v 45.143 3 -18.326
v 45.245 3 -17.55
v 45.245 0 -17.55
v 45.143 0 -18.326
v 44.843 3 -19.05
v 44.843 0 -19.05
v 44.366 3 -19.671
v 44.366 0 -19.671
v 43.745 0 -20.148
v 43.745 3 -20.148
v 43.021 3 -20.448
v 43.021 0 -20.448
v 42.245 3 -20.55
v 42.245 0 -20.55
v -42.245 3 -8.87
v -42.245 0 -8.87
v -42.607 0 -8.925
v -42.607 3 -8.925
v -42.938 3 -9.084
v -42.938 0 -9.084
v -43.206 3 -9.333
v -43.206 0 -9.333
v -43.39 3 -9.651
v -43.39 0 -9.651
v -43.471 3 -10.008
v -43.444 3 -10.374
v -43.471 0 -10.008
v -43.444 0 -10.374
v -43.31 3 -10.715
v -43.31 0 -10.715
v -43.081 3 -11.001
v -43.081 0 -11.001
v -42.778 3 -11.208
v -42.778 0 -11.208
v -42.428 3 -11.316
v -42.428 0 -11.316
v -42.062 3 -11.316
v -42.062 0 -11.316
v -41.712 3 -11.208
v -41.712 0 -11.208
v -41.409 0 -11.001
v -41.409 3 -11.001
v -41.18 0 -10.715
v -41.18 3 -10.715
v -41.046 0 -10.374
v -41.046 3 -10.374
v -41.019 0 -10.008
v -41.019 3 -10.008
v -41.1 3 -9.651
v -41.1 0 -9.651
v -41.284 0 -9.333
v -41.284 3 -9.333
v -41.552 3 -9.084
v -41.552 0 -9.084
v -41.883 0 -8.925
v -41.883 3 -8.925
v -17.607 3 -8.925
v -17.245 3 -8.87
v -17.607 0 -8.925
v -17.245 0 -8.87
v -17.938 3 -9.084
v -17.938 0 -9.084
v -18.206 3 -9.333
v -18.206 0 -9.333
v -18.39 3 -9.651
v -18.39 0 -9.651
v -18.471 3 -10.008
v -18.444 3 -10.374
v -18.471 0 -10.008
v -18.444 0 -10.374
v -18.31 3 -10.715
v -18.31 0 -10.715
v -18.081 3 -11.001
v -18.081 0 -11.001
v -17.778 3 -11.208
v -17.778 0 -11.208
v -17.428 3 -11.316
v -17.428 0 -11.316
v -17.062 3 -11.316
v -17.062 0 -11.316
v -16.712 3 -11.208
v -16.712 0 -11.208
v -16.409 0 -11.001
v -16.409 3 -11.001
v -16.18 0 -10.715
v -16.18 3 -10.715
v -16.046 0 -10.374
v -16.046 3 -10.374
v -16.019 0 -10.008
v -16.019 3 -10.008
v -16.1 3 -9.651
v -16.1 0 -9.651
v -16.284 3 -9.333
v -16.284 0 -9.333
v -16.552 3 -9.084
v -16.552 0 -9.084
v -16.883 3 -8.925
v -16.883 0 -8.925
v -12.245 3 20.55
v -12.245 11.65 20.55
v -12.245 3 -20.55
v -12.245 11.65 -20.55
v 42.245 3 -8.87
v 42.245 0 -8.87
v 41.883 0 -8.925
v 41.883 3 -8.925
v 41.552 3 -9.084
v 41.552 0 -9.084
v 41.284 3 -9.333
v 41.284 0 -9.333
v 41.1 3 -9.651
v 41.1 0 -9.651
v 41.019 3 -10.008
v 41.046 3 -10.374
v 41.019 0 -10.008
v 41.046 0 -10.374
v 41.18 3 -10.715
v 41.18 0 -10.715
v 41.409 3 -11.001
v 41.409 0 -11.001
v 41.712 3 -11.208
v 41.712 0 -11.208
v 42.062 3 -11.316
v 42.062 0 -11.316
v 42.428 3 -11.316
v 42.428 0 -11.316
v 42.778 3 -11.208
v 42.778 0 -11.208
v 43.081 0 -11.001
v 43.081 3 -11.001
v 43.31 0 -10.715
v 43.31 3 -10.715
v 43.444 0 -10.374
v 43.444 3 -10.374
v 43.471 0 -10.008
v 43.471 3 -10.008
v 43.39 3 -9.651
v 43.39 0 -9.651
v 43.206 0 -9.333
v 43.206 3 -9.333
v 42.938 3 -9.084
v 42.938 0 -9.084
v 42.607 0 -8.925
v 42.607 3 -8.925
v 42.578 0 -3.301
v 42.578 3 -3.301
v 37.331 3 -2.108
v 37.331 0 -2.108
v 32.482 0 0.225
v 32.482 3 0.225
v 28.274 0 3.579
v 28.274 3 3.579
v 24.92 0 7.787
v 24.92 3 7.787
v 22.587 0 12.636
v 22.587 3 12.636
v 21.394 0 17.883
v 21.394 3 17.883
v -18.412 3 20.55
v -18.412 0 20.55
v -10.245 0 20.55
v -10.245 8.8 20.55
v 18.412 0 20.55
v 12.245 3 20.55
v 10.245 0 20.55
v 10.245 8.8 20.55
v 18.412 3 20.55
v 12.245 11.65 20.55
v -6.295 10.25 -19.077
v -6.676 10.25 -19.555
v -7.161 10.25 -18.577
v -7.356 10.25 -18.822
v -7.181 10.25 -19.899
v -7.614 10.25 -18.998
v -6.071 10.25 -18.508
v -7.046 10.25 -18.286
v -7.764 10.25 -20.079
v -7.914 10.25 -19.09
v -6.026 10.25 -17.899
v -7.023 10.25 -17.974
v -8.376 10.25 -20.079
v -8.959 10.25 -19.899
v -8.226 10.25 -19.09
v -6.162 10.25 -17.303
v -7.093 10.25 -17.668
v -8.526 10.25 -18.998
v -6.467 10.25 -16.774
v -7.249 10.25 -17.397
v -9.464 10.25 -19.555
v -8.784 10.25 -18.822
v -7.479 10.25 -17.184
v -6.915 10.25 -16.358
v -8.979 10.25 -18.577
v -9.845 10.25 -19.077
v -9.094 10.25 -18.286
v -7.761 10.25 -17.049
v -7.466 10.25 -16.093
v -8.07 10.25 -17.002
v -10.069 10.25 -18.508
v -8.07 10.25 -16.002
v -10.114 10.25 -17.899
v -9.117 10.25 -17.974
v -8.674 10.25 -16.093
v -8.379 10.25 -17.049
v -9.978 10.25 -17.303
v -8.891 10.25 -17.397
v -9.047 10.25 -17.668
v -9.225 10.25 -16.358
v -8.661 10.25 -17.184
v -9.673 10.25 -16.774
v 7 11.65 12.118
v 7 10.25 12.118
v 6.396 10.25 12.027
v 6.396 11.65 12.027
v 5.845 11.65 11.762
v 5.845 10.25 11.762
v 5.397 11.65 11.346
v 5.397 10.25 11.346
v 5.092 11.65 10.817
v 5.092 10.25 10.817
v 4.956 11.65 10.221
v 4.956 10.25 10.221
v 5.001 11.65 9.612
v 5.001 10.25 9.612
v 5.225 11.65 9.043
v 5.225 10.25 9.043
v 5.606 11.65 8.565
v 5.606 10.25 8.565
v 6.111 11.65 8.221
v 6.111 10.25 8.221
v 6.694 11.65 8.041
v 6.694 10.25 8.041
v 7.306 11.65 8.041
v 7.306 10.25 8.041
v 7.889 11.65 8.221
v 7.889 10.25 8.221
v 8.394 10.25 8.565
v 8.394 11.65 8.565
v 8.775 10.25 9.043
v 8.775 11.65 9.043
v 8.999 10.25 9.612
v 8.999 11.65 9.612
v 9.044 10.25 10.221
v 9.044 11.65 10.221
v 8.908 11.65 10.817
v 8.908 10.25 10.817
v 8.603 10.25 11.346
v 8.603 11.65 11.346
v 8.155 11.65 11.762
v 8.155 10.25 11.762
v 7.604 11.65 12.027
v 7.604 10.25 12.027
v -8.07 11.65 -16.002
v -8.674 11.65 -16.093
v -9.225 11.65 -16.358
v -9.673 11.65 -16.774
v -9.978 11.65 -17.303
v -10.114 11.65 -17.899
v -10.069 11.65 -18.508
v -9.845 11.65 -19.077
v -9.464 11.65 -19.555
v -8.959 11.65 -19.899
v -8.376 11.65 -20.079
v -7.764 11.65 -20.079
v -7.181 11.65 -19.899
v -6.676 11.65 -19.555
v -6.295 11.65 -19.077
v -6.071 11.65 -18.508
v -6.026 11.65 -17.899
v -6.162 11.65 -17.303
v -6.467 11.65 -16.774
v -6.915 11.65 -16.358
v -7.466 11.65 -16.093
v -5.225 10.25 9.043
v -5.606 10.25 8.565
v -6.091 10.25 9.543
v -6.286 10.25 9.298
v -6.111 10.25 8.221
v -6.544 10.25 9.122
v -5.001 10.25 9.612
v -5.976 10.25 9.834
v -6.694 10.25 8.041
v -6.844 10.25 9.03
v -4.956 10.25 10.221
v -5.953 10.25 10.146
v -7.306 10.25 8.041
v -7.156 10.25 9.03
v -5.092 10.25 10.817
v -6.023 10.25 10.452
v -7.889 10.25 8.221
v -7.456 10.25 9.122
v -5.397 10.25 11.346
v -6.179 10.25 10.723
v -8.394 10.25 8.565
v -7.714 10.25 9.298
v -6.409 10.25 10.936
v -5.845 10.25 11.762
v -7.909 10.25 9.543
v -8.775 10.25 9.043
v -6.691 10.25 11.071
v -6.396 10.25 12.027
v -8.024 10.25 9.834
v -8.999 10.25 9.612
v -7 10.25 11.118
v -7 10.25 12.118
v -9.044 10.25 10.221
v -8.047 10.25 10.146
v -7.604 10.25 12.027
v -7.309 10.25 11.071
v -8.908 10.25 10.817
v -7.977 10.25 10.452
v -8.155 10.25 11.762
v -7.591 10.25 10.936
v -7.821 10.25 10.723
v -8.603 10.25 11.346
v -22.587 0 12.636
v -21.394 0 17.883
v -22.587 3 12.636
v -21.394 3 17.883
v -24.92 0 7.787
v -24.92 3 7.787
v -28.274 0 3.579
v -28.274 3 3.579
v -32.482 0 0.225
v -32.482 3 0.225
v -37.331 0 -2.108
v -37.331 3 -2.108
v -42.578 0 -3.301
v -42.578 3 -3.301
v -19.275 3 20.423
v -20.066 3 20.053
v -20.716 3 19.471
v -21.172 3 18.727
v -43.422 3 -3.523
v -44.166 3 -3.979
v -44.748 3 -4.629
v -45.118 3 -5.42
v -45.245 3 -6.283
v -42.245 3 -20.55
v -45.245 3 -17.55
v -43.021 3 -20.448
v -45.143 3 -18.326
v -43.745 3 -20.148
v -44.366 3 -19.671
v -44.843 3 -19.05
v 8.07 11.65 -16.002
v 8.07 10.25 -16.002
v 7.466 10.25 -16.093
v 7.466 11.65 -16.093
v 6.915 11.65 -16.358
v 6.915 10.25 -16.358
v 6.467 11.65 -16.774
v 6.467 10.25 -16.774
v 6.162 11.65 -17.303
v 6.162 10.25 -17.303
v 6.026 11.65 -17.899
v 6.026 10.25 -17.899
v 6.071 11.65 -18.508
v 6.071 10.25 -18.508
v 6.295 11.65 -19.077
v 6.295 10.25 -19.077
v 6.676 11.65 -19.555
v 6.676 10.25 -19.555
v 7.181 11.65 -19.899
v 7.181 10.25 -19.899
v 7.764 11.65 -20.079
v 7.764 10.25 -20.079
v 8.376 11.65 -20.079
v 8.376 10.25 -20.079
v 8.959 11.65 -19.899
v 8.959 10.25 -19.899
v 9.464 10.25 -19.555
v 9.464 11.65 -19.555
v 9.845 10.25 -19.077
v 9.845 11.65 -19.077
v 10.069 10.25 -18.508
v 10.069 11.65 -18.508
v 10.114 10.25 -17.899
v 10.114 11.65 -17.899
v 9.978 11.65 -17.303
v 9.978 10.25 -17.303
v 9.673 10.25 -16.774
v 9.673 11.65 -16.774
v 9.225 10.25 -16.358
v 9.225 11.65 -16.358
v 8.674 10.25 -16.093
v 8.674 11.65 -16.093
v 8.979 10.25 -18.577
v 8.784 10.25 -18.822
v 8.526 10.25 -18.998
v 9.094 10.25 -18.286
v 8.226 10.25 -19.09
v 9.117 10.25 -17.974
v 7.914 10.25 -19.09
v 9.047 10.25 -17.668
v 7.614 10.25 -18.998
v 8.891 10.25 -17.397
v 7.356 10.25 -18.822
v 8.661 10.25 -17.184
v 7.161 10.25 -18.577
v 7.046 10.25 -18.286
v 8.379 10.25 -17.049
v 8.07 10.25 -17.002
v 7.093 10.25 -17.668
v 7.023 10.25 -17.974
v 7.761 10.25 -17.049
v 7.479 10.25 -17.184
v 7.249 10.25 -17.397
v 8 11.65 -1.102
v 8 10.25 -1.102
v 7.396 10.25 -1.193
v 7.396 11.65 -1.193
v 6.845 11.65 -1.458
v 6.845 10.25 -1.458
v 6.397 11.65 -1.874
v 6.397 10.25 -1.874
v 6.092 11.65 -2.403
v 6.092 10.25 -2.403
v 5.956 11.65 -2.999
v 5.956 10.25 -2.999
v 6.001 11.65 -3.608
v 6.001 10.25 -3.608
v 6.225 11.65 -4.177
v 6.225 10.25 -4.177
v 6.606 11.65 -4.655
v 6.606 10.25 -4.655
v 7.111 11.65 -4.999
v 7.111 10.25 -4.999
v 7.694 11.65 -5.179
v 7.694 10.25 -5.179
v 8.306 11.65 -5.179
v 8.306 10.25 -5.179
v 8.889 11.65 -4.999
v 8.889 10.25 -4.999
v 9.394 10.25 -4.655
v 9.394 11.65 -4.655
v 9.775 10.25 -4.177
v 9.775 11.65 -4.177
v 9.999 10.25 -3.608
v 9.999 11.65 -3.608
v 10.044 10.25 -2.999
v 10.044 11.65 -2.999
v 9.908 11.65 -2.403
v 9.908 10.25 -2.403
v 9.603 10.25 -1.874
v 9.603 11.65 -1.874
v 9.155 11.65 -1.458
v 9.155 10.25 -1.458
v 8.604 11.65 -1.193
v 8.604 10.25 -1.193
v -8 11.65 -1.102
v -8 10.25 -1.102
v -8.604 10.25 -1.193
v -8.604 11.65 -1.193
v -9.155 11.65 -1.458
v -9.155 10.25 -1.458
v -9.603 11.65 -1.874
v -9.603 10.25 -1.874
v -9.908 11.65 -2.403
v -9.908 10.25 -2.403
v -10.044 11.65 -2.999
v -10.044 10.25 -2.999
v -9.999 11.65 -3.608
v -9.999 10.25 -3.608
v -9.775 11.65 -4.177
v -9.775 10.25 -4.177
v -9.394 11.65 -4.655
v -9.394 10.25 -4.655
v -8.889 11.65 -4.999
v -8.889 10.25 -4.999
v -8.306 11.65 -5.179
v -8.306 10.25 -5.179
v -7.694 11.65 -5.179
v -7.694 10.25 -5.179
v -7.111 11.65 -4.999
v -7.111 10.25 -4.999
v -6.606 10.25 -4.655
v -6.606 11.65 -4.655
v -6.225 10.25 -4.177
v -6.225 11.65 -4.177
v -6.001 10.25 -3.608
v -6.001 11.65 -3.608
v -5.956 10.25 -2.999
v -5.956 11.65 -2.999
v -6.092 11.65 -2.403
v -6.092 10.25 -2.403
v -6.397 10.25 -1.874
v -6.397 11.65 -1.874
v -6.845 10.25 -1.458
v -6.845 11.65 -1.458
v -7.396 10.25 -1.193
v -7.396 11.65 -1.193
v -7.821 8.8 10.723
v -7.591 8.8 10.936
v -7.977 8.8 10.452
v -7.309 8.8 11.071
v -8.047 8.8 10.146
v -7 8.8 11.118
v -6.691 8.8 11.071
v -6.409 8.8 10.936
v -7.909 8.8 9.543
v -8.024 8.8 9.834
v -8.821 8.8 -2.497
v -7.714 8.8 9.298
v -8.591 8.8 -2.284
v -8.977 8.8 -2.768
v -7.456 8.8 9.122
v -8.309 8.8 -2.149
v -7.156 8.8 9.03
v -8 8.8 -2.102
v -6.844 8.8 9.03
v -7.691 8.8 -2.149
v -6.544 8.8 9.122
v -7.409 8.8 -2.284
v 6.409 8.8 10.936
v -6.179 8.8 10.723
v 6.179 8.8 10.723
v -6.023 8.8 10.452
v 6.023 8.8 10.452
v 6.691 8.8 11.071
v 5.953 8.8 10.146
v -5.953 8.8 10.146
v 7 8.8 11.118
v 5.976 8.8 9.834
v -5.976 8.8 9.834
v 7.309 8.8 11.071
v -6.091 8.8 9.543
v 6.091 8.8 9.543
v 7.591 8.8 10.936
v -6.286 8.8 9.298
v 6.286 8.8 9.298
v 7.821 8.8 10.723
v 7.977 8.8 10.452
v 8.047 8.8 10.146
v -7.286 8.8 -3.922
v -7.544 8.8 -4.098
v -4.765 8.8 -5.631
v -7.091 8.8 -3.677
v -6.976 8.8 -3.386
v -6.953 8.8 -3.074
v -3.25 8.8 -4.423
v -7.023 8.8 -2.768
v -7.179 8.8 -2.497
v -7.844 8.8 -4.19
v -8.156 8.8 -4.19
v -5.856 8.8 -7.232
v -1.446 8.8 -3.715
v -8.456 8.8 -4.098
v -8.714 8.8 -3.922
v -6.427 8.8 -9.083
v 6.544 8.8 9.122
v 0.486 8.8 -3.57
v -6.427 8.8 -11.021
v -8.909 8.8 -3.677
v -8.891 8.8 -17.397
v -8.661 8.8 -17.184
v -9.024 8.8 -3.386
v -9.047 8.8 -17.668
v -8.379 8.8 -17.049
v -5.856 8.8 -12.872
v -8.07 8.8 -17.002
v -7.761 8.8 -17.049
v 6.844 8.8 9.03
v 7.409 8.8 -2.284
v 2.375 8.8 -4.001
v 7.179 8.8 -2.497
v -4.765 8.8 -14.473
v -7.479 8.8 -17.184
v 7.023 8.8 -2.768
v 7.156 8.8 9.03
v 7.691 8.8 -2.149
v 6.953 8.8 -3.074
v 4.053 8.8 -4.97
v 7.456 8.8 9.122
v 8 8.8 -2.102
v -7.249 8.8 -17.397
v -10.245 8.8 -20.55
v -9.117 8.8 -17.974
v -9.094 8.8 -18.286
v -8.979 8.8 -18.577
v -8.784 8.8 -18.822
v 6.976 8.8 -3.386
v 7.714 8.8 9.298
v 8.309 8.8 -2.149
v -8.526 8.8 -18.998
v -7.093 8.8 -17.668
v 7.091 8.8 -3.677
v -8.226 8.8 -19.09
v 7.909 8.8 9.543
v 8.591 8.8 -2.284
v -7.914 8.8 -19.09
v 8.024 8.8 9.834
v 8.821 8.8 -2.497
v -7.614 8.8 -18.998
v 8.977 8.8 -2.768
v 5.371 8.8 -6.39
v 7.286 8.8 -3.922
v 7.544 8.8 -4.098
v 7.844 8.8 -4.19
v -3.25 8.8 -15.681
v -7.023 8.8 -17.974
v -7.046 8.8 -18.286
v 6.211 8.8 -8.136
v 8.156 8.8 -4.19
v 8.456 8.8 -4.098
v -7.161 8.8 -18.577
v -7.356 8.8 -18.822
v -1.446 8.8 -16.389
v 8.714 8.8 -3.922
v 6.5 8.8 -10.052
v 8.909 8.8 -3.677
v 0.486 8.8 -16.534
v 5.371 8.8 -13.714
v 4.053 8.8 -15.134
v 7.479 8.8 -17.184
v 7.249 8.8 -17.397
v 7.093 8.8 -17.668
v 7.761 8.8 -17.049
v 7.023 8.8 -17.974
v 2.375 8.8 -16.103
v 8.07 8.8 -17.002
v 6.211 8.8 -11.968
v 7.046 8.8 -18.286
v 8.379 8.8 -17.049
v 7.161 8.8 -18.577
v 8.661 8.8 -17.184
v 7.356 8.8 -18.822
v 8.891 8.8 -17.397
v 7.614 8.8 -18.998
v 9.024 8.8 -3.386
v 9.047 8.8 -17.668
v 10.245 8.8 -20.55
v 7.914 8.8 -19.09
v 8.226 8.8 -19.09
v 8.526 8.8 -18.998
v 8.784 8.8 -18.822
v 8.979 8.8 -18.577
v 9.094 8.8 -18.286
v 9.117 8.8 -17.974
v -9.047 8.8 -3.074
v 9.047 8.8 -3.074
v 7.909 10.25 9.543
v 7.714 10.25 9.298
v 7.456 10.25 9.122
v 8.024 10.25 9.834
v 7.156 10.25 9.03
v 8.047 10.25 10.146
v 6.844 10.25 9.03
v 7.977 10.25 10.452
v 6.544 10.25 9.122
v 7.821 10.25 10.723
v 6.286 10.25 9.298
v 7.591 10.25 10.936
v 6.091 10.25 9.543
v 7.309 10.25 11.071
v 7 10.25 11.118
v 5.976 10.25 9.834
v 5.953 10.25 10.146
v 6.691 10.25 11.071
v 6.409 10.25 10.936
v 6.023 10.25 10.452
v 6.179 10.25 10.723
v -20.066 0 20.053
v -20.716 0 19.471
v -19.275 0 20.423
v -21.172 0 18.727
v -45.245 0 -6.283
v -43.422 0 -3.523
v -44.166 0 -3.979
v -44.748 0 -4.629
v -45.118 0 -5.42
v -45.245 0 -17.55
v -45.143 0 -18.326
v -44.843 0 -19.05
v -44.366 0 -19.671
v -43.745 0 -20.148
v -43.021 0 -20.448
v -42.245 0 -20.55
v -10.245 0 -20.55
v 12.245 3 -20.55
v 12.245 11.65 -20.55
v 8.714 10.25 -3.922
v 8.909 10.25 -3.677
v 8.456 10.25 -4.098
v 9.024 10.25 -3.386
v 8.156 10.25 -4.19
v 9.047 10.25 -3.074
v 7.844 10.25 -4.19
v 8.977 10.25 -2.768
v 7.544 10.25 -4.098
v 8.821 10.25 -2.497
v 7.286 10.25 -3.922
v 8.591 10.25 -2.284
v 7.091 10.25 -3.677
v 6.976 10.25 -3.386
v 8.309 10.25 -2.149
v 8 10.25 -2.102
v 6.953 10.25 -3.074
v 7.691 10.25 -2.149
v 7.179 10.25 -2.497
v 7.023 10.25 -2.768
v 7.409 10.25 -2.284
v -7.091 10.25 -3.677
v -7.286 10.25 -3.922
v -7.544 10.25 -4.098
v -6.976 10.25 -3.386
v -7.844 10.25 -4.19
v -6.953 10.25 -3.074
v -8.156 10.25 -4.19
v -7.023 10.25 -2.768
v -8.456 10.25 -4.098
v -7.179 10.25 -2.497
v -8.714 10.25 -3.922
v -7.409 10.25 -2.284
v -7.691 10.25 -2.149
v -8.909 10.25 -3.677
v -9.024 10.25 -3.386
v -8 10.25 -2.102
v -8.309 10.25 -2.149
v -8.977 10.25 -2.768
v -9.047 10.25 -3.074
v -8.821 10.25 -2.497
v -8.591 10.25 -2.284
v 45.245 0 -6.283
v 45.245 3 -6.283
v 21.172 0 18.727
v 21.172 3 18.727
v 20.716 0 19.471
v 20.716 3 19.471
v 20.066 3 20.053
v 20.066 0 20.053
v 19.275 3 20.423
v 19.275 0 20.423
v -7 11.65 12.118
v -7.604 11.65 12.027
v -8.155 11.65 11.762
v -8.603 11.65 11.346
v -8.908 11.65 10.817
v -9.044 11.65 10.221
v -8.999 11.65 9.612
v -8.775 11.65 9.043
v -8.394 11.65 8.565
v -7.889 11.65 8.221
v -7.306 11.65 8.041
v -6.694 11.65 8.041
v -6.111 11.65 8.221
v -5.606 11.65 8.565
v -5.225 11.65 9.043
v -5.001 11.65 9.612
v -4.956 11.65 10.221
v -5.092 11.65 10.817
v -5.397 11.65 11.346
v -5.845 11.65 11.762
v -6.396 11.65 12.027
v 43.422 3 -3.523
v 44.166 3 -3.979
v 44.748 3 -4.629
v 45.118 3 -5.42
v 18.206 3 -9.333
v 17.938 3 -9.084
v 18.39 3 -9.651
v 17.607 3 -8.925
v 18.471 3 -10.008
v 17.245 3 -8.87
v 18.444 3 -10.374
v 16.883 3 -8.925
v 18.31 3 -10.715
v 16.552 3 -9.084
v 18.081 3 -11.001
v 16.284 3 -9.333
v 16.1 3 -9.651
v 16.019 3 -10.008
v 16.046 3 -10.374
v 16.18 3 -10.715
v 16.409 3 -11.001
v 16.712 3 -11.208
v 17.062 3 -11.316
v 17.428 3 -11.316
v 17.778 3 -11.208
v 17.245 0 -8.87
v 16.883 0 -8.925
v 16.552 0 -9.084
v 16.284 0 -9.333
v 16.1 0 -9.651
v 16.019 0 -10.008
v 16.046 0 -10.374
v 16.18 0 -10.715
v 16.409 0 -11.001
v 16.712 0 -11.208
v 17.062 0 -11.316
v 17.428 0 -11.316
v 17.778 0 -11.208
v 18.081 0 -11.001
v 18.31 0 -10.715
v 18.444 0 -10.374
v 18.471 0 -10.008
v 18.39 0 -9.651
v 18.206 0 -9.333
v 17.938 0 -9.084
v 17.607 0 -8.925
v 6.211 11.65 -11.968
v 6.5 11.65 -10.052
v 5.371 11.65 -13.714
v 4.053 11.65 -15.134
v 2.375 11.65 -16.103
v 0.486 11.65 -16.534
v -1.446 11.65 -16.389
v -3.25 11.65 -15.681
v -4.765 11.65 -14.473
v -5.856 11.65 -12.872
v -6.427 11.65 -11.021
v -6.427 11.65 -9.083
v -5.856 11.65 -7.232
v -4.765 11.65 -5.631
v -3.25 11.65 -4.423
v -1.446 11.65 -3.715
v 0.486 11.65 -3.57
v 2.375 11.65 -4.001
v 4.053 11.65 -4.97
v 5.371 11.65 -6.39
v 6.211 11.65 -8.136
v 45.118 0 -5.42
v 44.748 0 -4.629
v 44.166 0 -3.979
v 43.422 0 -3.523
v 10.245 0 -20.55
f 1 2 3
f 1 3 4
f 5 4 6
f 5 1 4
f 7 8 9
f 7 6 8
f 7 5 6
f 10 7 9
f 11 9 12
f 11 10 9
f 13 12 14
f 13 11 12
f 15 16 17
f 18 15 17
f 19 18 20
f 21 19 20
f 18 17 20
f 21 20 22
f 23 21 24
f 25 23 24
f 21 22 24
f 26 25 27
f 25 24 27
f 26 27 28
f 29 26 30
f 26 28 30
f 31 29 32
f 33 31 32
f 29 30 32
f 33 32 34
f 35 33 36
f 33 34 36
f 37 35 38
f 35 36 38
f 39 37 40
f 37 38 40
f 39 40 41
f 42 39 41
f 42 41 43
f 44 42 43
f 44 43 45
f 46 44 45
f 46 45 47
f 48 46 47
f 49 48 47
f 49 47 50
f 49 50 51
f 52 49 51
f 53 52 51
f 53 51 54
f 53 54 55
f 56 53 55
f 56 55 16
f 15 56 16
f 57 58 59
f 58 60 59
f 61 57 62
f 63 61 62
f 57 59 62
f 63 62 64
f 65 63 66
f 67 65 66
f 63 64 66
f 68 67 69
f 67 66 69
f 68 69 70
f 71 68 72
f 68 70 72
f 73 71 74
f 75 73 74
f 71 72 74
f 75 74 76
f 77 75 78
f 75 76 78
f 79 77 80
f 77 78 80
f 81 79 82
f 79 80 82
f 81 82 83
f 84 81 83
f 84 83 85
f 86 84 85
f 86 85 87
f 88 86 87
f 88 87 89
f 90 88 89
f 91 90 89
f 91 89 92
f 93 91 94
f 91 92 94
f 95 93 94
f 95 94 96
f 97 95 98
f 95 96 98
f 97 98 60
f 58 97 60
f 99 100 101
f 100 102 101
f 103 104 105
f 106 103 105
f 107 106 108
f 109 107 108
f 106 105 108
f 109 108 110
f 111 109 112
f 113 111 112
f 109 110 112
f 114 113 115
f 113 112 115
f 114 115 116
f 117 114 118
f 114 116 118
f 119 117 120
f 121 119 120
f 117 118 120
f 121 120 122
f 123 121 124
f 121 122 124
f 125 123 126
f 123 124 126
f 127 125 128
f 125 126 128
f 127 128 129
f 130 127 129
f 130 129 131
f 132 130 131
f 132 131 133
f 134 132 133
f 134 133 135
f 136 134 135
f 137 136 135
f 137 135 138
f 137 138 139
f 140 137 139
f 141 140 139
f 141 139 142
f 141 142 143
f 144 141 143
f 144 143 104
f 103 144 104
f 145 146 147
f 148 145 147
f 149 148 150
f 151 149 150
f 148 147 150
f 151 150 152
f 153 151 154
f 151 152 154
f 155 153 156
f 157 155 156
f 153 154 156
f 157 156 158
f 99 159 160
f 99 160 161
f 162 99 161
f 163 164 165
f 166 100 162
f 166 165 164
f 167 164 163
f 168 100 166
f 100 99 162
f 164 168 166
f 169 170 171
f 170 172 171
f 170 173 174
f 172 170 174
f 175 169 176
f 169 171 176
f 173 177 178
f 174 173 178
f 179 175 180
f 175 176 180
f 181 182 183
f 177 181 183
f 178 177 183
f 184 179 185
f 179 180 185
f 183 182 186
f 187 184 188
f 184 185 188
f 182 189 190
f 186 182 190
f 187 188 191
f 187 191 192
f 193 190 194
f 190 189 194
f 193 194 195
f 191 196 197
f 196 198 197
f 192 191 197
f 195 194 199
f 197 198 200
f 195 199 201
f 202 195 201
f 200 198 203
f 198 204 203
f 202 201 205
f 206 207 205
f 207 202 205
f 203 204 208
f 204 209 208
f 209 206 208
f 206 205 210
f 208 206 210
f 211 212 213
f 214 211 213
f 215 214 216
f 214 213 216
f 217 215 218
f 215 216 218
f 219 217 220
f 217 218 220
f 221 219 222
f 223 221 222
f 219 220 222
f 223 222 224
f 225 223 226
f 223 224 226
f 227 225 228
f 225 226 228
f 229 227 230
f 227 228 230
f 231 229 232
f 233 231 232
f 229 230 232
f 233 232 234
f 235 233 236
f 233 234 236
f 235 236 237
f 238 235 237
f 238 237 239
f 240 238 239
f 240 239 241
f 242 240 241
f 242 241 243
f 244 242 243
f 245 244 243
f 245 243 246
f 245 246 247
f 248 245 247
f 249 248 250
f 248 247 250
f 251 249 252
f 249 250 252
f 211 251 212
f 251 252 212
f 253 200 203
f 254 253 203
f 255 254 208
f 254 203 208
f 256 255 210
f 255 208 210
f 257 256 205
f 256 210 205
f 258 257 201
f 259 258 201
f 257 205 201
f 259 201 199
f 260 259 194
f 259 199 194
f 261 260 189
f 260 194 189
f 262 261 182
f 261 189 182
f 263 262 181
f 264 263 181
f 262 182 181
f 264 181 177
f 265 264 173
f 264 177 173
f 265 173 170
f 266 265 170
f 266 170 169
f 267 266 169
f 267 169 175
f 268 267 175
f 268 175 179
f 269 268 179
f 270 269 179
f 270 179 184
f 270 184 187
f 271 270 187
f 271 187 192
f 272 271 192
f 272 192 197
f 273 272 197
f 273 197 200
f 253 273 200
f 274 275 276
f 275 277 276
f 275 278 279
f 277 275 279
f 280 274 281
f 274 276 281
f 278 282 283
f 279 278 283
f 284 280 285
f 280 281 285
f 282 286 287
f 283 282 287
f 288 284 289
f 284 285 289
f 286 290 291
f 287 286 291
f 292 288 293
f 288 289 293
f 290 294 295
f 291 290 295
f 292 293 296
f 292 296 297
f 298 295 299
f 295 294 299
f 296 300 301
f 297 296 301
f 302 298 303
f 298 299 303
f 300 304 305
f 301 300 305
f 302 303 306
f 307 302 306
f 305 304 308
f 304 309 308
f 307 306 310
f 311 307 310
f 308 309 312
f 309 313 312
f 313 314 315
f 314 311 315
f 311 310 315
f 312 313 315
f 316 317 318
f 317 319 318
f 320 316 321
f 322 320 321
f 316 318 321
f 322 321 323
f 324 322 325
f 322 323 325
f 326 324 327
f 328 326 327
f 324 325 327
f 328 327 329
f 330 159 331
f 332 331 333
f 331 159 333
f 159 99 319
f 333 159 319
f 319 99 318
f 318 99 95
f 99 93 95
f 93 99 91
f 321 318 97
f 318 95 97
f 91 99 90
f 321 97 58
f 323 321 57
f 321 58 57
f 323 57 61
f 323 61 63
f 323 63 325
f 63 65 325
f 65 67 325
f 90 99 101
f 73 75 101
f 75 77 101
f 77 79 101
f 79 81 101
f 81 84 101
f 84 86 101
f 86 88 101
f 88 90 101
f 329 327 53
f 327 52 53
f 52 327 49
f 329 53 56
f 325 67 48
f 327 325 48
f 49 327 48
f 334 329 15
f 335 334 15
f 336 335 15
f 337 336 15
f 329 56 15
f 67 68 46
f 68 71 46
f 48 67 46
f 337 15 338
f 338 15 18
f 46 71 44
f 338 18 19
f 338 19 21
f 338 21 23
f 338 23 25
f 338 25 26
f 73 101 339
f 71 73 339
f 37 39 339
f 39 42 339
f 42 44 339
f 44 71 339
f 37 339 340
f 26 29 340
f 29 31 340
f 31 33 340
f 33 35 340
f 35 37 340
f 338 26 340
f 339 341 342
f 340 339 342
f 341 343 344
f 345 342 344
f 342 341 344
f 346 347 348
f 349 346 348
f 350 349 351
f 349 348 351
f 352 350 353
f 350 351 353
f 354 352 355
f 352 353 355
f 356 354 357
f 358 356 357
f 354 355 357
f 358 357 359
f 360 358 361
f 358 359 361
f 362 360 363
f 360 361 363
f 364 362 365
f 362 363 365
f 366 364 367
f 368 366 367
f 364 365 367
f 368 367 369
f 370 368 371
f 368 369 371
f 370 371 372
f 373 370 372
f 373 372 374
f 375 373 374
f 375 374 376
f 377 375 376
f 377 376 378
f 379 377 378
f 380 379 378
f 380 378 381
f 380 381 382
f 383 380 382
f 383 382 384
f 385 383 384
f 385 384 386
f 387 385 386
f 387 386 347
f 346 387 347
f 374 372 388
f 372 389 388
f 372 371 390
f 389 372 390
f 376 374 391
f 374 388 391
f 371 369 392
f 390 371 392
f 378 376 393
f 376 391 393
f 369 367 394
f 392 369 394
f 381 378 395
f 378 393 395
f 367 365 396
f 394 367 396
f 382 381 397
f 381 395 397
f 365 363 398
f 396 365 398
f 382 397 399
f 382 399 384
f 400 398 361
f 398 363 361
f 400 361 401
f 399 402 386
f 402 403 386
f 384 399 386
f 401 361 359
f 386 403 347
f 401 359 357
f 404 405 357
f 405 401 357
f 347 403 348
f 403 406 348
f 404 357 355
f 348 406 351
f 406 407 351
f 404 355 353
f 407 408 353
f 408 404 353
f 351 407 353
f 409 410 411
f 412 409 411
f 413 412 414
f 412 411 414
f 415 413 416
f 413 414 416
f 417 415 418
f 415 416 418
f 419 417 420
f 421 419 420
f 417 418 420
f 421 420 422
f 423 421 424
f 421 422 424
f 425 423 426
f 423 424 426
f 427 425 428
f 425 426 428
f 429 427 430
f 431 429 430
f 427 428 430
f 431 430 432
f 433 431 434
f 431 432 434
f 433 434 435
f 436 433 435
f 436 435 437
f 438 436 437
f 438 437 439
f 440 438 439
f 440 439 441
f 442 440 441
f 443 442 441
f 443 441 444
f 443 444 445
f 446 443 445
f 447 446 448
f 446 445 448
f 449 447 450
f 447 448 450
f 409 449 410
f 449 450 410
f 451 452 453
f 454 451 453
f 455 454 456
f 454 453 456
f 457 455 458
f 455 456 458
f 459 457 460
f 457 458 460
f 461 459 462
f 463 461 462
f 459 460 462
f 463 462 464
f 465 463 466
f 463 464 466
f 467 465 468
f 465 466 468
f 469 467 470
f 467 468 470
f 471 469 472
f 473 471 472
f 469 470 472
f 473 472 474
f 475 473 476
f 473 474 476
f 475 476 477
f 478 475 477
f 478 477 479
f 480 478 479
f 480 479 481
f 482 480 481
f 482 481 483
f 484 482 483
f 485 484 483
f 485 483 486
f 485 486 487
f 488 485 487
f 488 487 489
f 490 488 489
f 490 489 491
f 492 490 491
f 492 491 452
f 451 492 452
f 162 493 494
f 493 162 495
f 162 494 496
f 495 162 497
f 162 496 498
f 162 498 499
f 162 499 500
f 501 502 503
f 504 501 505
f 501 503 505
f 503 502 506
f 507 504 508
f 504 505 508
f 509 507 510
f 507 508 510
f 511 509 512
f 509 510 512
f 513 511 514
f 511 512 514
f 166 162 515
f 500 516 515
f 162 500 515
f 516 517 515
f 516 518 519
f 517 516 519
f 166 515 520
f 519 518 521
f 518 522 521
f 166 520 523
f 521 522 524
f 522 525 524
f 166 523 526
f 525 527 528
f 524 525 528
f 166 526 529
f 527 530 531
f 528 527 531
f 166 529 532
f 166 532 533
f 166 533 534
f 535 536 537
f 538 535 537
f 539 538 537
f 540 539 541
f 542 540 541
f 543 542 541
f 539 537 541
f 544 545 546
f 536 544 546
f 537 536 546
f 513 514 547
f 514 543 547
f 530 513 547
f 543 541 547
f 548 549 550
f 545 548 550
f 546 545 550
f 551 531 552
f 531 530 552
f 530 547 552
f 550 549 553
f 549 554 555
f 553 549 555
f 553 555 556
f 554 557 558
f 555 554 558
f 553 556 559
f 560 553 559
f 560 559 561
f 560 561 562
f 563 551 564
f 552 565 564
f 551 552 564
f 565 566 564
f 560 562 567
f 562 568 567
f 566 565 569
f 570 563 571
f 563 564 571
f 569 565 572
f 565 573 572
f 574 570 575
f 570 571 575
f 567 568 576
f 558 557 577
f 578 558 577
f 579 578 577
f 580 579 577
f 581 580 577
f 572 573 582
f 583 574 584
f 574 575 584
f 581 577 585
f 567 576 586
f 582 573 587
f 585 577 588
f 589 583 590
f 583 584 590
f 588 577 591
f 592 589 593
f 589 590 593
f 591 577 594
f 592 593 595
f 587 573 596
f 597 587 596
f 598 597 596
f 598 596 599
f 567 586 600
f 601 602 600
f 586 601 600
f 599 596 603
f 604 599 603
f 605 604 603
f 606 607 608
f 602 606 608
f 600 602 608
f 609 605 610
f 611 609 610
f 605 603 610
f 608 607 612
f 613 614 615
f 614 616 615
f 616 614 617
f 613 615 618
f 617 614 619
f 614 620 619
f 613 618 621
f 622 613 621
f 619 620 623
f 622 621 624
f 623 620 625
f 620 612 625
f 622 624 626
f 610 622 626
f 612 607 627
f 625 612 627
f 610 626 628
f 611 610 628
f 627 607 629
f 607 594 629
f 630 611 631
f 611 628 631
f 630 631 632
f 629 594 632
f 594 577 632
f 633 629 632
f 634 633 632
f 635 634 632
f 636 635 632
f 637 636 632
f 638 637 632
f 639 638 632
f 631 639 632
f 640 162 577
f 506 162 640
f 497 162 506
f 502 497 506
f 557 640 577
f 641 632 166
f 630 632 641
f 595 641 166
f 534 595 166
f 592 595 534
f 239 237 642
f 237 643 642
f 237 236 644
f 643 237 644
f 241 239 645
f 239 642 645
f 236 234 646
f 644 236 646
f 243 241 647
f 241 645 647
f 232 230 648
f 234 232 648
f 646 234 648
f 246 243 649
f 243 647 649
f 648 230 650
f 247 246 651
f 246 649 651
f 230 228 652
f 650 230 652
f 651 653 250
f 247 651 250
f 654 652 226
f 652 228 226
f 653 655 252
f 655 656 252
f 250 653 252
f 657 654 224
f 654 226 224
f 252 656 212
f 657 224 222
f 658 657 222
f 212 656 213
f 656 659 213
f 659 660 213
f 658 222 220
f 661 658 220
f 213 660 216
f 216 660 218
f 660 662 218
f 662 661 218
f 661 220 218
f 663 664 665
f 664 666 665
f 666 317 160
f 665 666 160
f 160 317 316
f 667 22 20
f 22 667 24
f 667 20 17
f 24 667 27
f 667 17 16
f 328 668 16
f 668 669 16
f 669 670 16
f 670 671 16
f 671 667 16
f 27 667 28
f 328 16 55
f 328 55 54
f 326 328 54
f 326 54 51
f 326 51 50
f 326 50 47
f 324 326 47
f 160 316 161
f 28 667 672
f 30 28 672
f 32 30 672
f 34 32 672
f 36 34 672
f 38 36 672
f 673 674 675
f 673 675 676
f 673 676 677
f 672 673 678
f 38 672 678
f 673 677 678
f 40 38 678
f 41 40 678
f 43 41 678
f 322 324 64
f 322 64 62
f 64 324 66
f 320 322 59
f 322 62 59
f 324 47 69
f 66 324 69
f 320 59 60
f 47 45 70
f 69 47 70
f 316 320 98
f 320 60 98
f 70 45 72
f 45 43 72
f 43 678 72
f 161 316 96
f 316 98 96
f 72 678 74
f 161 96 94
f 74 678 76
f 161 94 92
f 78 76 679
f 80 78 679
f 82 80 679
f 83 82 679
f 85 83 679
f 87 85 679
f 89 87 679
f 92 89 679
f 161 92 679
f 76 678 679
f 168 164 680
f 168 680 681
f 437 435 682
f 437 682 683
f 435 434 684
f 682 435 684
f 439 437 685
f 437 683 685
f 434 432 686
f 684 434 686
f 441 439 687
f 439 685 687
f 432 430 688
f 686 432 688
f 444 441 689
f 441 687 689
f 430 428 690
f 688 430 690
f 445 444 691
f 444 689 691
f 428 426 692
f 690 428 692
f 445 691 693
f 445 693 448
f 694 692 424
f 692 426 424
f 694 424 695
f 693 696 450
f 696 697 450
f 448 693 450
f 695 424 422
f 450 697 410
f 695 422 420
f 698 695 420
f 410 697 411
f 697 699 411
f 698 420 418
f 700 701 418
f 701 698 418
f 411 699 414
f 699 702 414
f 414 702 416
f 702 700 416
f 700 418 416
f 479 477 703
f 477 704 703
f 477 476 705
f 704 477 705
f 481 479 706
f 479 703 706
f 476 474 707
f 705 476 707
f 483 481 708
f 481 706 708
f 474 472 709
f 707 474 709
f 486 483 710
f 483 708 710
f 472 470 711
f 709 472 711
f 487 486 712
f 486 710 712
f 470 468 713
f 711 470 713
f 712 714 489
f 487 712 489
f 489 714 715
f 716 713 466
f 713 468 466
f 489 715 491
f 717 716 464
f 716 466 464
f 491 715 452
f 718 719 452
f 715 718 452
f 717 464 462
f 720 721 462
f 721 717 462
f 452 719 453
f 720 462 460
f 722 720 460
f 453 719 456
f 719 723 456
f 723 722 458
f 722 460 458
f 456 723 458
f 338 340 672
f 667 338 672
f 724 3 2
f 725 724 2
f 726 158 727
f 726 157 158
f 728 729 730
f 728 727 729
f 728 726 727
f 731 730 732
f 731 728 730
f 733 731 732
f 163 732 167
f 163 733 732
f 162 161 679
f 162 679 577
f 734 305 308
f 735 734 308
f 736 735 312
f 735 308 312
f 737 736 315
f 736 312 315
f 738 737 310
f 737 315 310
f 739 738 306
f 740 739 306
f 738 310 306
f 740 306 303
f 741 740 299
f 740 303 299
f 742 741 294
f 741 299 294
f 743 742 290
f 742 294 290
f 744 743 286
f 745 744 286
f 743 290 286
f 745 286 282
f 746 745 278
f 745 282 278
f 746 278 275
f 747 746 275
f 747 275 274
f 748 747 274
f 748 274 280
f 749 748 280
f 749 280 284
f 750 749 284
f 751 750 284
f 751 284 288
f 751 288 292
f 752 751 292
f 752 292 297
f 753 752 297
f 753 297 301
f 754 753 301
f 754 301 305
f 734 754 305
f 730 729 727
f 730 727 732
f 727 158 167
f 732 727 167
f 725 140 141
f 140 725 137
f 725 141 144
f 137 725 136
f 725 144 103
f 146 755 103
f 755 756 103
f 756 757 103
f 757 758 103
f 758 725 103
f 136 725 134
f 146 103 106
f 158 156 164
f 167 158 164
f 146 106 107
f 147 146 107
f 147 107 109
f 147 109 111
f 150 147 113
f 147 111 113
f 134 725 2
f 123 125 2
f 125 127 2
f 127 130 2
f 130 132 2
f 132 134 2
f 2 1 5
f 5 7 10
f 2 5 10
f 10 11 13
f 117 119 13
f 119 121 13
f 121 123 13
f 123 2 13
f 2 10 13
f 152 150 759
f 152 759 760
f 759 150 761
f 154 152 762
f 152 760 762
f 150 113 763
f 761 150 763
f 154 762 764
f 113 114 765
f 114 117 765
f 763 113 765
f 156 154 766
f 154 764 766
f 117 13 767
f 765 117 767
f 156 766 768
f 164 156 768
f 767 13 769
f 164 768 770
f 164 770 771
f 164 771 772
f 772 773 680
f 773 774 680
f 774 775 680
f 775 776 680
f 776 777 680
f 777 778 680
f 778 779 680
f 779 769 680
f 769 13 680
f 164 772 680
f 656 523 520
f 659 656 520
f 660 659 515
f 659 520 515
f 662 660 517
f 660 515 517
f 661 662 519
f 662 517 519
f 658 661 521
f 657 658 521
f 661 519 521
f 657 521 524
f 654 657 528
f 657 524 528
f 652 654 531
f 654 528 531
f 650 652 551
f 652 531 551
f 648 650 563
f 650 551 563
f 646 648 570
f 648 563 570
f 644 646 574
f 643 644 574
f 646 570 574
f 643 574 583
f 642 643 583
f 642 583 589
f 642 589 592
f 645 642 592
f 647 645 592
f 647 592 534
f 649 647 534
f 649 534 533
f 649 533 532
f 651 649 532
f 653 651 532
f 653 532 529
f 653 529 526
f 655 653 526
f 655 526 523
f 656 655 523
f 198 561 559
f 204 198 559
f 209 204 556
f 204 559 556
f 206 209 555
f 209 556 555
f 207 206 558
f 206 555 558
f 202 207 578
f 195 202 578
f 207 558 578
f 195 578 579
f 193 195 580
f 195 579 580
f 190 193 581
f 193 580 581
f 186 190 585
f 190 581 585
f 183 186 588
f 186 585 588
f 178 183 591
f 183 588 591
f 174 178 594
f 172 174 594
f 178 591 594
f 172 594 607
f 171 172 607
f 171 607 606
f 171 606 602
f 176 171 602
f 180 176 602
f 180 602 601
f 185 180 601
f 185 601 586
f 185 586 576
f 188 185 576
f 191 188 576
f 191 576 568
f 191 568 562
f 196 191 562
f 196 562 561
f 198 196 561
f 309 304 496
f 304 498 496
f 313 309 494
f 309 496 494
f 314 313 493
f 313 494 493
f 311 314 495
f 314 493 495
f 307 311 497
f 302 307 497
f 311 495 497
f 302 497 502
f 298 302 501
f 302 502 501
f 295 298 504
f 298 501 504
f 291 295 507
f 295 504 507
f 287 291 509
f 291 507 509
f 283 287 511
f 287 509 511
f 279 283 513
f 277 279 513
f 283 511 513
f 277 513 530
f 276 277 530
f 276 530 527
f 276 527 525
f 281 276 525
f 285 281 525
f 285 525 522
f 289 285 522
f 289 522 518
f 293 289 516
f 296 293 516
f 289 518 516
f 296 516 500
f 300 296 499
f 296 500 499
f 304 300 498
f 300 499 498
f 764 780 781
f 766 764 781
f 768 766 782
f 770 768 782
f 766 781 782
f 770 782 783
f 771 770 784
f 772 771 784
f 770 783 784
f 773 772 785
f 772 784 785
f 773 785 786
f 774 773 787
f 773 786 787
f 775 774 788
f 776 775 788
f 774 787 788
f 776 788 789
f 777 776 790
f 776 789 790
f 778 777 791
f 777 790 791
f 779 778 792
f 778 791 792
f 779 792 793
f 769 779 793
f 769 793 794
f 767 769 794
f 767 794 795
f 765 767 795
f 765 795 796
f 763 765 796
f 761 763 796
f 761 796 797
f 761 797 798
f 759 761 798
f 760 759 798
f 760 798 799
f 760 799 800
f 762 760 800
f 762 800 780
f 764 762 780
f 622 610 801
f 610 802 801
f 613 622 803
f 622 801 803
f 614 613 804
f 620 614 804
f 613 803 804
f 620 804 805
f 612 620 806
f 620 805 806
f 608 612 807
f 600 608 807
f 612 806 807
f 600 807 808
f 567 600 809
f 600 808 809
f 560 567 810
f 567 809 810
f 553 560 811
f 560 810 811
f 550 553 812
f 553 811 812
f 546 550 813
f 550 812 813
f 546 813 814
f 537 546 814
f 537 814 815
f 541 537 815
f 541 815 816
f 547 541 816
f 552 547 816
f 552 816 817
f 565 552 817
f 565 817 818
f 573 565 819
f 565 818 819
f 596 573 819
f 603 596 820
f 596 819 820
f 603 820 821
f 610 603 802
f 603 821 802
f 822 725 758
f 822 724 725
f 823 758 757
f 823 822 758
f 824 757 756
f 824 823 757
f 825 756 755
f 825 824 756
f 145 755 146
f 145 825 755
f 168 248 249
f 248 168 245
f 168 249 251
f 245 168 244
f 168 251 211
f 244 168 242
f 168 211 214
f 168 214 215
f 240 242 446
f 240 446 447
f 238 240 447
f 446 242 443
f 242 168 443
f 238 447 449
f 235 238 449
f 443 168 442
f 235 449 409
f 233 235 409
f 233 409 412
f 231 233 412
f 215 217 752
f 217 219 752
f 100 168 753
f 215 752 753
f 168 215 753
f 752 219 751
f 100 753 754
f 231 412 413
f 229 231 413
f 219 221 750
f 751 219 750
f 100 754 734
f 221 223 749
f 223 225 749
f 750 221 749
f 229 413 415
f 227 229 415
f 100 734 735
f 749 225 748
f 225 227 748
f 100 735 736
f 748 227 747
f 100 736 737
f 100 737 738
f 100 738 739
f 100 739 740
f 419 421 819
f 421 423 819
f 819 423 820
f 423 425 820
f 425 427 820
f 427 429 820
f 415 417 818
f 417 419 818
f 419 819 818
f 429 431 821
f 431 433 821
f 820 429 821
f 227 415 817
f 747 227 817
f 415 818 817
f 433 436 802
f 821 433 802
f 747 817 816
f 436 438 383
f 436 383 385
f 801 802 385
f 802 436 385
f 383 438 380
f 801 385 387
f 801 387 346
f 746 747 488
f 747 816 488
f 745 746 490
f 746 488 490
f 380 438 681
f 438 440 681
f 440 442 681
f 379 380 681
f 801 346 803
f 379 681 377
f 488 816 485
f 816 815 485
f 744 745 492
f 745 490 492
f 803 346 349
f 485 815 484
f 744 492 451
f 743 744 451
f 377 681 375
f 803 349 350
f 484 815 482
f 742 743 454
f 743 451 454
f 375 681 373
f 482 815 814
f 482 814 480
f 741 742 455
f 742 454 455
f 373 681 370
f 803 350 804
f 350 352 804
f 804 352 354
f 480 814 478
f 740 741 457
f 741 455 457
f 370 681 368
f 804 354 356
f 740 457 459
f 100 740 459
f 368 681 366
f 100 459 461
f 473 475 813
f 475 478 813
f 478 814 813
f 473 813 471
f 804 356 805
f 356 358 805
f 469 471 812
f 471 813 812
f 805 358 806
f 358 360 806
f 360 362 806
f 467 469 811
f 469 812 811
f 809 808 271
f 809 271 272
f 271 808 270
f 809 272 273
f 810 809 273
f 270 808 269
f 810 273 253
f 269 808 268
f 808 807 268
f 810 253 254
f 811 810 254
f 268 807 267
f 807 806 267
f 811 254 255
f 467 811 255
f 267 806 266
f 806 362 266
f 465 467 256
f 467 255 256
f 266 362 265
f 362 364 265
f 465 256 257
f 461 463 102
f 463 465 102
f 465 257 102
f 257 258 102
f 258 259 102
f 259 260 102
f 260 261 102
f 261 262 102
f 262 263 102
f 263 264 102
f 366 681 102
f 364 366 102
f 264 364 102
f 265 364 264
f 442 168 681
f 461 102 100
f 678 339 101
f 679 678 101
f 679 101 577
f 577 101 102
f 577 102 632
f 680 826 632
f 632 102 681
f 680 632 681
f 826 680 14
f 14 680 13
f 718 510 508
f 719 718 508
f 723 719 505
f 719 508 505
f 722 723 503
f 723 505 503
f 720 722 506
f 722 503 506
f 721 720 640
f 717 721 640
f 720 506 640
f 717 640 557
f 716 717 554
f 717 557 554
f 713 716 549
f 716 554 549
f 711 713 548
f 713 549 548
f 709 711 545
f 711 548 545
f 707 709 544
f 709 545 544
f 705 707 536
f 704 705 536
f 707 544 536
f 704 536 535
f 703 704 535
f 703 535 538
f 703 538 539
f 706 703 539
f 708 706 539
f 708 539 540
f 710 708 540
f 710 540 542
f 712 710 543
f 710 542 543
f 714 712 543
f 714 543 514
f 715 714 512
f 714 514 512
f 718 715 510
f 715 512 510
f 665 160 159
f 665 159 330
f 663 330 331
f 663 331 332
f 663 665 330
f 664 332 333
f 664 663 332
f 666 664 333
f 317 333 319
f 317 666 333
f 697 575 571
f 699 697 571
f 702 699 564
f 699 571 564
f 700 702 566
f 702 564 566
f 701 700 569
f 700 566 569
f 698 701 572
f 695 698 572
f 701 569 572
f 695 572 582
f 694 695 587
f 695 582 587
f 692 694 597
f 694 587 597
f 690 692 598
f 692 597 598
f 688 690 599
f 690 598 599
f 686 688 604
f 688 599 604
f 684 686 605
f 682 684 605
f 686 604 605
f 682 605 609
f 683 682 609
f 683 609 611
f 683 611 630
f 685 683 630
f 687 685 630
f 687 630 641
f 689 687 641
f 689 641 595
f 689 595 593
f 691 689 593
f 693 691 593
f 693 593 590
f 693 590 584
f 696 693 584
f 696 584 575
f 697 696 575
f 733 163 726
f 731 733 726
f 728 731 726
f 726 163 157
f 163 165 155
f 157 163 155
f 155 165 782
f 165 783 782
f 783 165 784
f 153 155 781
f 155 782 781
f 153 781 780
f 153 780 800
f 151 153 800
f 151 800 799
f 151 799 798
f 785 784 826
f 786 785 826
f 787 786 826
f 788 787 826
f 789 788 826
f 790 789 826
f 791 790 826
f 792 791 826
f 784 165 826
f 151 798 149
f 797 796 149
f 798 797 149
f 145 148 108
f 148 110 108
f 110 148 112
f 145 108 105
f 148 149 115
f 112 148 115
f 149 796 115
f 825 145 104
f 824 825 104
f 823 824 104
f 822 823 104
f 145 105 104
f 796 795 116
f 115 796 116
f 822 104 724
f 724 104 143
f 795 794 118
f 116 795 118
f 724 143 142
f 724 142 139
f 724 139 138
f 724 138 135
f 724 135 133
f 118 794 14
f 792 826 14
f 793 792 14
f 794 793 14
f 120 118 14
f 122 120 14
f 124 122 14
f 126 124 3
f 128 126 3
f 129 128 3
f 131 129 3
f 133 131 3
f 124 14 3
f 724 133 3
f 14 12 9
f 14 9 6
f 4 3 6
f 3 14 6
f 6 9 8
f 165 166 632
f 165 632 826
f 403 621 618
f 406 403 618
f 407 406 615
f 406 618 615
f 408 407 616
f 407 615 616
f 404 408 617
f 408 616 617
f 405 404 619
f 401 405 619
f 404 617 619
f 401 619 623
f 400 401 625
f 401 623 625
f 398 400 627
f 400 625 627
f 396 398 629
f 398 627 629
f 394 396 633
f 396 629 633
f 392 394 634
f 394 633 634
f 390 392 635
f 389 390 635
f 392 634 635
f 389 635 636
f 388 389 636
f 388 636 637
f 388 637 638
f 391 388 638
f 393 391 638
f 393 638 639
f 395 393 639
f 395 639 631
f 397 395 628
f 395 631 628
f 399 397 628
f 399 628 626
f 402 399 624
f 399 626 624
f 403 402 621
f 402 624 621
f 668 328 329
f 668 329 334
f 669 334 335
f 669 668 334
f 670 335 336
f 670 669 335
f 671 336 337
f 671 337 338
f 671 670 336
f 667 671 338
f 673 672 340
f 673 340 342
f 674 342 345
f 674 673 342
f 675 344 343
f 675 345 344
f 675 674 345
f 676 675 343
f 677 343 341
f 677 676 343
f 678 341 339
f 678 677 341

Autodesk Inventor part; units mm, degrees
ref_plane "YZ Plane" through (0, 0, 0) normal (1, 0, 0) x (0, 1, 0)
ref_plane "XZ Plane" through (0, 0, 0) normal (0, 1, 0) x (-1, 0, 0)
ref_plane "XY Plane" through (0, 0, 0) normal (0, 0, 1) x (1, 0, 0)
sketch "Sketch1" plane through (0, 0, 0) normal (0, 0, 1) x (1, 0, 0)
  line L0 (-12.245, 11.65) -> (-12.245, 3)
  line L1 (-12.245, 3) -> (-45.245, 3)
  line L2 (-45.245, 3) -> (-45.245, 0)
  line L3 (-45.245, 0) -> (-10.245, 0)
  line L4 (-10.245, 0) -> (-10.245, 8.8)
  line L5 (-10.245, 8.8) -> (10.245, 8.8)
  line L6 (10.245, 8.8) -> (10.245, 0)
  line L7 (10.245, 0) -> (45.245, 0)
  line L8 (45.245, 0) -> (45.245, 3)
  line L9 (45.245, 3) -> (12.245, 3)
  line L10 (12.245, 3) -> (12.245, 11.65)
  line L11 (12.245, 11.65) -> (-12.245, 11.65)
  line L12 (-10.245, 0) -> (10.245, 0) construction
  point P0 (0, 0)
  point P1 (0, 11.65)
  point P2 (0, 0)
  point P3 (-12.245, 7.325)
  point P4 (12.245, 7.325)
  dimension "d0" = 20.49
  dimension "d1" = 2.85
  dimension "d3" = 5.8
  dimension "d4" = 3
  dimension "d5" = 3
  dimension "d6" = 35
  dimension "d7" = 35
  dimension "d73" = 33
  dimension "d74" = 33
extrude "Extrusion1" add sketch "Sketch1" along normal mid plane 41.1
sketch "Sketch8" plane through (12.245, 3, 20.55) normal (0, 1, 0) x (1, 0, 0)
  line L0 (0, 41.1) -> (0, 0)
  line L1 (33, 0) -> (0, 0) projected
  line L2 (33, 41.1) -> (33, 0) projected
  line L3 (0, 41.1) -> (33, 41.1) projected
  line L4 (-57.49, 41.1) -> (-57.49, 0) projected
  line L5 (-24.49, 0) -> (-57.49, 0) projected
  line L6 (-24.49, 0) -> (-24.49, 41.1) projected
  line L7 (-57.49, 41.1) -> (-24.49, 41.1) projected
  line L8 (33, 41.1) -> (33, 0) projected
  circle A0 centre (-11.645, 30.6) radius 6.4 projected
  line L9 (-12.245, 41) -> (-12.245, 0) construction
  point P0 (-12.245, 20.55)
  point P1 (-54.49, 30.65)
  point P2 (-29.49, 30.65)
  point P3 (-57.49, 20.55)
  point P4 (30, 30.65)
  point P5 (5, 30.65)
  dimension "d42" = 3
  dimension "d43" = 25
  dimension "d51" = 10.45
  dimension "d53" = 3
hole "Hole1" at (-42.245, 3, -10.1) at (-17.245, 3, -10.1) at (17.245, 3, -10.1) at (42.245, 3, -10.1) direction (0, -1, 0) diameter 2.459 end through all thread size "M3x0.5" class "6H" standard "ISO Metric profile"
sketch "Sketch9" plane through (12.245, 3, 20.55) normal (0, 1, 0) x (1, 0, 0)
  circle A0 centre (30, 30.65) radius 1.2295 projected
  circle A1 centre (5, 30.65) radius 1.2295 projected
  line L0 (0, 41.1) -> (0, 0) projected
  line L1 (33, 0) -> (0, 0) projected
  line L2 (33, 41.1) -> (33, 0) projected
  line L3 (0, 41.1) -> (33, 41.1) projected
  arc A2 (33, 24) -> (9, 0) centre (33, 0) ccw
  point P0 (-12.245, 20.55)
  dimension "d60" = 24
extrude "Extrusion2" cut sketch "Sketch9" against normal blind 10 contours A2 L2 L1
mirror "Mirror1" about plane through (0, 0, 0) normal (1, 0, 0) of "Extrusion2"
sketch "Sketch10" plane through (-12.245, 11.65, 20.55) normal (0, 1, 0) x (1, 0, 0)
  circle A0 centre (12.245, 30.602) radius 6.5
  line L0 (0, 41.1) -> (0, 0) projected
  line L1 (24.49, 0) -> (0, 0) projected
  line L2 (24.49, 41.1) -> (24.49, 0) projected
  line L3 (0, 41.1) -> (24.49, 41.1) projected
  point P0 (12.245, 20.55)
  point P1 (12.245, 41.1)
  dimension "d75" = 13
  dimension "d76" = 10.498
extrude "Extrusion3" cut sketch "Sketch10" against normal blind 10 contours A0
sketch "Sketch11" plane through (-12.245, 11.65, 20.55) normal (0, 1, 0) x (1, 0, 0)
  circle A0 centre (5.245, 10.482) radius 0.7835
  circle A1 centre (4.245, 23.702) radius 0.7835
  circle A2 centre (4.175, 38.602) radius 0.7835
  circle A3 centre (20.315, 38.602) radius 0.7835
  circle A4 centre (20.245, 23.702) radius 0.7835
  circle A5 centre (19.245, 10.482) radius 0.7835
hole "Hole2" at (-8, 11.65, -3.152) at (8, 11.65, -3.152) at (8.07, 11.65, -18.052) at (-8.07, 11.65, -18.052) at (-7, 11.65, 10.068) at (7, 11.65, 10.068) direction (0, -1, 0) diameter 2.1 end through all counterbore diameter 4.1 counterbore depth 1.4
fillet "Fillet3" radius 3 6 edges at (-21.245, 1.5, 20.55) (-45.245, 1.5, -3.45) (-45.245, 1.5, -20.55) (21.245, 1.5, 20.55) (45.245, 1.5, -3.45) (45.245, 1.5, -20.55)
ref_plane "Work Plane1" through (0, 0, 0) normal (1, 0, 0) x (0, 1, 0)
properties part number "gripper_fixer" material "Aluminum 6061-AHC"
